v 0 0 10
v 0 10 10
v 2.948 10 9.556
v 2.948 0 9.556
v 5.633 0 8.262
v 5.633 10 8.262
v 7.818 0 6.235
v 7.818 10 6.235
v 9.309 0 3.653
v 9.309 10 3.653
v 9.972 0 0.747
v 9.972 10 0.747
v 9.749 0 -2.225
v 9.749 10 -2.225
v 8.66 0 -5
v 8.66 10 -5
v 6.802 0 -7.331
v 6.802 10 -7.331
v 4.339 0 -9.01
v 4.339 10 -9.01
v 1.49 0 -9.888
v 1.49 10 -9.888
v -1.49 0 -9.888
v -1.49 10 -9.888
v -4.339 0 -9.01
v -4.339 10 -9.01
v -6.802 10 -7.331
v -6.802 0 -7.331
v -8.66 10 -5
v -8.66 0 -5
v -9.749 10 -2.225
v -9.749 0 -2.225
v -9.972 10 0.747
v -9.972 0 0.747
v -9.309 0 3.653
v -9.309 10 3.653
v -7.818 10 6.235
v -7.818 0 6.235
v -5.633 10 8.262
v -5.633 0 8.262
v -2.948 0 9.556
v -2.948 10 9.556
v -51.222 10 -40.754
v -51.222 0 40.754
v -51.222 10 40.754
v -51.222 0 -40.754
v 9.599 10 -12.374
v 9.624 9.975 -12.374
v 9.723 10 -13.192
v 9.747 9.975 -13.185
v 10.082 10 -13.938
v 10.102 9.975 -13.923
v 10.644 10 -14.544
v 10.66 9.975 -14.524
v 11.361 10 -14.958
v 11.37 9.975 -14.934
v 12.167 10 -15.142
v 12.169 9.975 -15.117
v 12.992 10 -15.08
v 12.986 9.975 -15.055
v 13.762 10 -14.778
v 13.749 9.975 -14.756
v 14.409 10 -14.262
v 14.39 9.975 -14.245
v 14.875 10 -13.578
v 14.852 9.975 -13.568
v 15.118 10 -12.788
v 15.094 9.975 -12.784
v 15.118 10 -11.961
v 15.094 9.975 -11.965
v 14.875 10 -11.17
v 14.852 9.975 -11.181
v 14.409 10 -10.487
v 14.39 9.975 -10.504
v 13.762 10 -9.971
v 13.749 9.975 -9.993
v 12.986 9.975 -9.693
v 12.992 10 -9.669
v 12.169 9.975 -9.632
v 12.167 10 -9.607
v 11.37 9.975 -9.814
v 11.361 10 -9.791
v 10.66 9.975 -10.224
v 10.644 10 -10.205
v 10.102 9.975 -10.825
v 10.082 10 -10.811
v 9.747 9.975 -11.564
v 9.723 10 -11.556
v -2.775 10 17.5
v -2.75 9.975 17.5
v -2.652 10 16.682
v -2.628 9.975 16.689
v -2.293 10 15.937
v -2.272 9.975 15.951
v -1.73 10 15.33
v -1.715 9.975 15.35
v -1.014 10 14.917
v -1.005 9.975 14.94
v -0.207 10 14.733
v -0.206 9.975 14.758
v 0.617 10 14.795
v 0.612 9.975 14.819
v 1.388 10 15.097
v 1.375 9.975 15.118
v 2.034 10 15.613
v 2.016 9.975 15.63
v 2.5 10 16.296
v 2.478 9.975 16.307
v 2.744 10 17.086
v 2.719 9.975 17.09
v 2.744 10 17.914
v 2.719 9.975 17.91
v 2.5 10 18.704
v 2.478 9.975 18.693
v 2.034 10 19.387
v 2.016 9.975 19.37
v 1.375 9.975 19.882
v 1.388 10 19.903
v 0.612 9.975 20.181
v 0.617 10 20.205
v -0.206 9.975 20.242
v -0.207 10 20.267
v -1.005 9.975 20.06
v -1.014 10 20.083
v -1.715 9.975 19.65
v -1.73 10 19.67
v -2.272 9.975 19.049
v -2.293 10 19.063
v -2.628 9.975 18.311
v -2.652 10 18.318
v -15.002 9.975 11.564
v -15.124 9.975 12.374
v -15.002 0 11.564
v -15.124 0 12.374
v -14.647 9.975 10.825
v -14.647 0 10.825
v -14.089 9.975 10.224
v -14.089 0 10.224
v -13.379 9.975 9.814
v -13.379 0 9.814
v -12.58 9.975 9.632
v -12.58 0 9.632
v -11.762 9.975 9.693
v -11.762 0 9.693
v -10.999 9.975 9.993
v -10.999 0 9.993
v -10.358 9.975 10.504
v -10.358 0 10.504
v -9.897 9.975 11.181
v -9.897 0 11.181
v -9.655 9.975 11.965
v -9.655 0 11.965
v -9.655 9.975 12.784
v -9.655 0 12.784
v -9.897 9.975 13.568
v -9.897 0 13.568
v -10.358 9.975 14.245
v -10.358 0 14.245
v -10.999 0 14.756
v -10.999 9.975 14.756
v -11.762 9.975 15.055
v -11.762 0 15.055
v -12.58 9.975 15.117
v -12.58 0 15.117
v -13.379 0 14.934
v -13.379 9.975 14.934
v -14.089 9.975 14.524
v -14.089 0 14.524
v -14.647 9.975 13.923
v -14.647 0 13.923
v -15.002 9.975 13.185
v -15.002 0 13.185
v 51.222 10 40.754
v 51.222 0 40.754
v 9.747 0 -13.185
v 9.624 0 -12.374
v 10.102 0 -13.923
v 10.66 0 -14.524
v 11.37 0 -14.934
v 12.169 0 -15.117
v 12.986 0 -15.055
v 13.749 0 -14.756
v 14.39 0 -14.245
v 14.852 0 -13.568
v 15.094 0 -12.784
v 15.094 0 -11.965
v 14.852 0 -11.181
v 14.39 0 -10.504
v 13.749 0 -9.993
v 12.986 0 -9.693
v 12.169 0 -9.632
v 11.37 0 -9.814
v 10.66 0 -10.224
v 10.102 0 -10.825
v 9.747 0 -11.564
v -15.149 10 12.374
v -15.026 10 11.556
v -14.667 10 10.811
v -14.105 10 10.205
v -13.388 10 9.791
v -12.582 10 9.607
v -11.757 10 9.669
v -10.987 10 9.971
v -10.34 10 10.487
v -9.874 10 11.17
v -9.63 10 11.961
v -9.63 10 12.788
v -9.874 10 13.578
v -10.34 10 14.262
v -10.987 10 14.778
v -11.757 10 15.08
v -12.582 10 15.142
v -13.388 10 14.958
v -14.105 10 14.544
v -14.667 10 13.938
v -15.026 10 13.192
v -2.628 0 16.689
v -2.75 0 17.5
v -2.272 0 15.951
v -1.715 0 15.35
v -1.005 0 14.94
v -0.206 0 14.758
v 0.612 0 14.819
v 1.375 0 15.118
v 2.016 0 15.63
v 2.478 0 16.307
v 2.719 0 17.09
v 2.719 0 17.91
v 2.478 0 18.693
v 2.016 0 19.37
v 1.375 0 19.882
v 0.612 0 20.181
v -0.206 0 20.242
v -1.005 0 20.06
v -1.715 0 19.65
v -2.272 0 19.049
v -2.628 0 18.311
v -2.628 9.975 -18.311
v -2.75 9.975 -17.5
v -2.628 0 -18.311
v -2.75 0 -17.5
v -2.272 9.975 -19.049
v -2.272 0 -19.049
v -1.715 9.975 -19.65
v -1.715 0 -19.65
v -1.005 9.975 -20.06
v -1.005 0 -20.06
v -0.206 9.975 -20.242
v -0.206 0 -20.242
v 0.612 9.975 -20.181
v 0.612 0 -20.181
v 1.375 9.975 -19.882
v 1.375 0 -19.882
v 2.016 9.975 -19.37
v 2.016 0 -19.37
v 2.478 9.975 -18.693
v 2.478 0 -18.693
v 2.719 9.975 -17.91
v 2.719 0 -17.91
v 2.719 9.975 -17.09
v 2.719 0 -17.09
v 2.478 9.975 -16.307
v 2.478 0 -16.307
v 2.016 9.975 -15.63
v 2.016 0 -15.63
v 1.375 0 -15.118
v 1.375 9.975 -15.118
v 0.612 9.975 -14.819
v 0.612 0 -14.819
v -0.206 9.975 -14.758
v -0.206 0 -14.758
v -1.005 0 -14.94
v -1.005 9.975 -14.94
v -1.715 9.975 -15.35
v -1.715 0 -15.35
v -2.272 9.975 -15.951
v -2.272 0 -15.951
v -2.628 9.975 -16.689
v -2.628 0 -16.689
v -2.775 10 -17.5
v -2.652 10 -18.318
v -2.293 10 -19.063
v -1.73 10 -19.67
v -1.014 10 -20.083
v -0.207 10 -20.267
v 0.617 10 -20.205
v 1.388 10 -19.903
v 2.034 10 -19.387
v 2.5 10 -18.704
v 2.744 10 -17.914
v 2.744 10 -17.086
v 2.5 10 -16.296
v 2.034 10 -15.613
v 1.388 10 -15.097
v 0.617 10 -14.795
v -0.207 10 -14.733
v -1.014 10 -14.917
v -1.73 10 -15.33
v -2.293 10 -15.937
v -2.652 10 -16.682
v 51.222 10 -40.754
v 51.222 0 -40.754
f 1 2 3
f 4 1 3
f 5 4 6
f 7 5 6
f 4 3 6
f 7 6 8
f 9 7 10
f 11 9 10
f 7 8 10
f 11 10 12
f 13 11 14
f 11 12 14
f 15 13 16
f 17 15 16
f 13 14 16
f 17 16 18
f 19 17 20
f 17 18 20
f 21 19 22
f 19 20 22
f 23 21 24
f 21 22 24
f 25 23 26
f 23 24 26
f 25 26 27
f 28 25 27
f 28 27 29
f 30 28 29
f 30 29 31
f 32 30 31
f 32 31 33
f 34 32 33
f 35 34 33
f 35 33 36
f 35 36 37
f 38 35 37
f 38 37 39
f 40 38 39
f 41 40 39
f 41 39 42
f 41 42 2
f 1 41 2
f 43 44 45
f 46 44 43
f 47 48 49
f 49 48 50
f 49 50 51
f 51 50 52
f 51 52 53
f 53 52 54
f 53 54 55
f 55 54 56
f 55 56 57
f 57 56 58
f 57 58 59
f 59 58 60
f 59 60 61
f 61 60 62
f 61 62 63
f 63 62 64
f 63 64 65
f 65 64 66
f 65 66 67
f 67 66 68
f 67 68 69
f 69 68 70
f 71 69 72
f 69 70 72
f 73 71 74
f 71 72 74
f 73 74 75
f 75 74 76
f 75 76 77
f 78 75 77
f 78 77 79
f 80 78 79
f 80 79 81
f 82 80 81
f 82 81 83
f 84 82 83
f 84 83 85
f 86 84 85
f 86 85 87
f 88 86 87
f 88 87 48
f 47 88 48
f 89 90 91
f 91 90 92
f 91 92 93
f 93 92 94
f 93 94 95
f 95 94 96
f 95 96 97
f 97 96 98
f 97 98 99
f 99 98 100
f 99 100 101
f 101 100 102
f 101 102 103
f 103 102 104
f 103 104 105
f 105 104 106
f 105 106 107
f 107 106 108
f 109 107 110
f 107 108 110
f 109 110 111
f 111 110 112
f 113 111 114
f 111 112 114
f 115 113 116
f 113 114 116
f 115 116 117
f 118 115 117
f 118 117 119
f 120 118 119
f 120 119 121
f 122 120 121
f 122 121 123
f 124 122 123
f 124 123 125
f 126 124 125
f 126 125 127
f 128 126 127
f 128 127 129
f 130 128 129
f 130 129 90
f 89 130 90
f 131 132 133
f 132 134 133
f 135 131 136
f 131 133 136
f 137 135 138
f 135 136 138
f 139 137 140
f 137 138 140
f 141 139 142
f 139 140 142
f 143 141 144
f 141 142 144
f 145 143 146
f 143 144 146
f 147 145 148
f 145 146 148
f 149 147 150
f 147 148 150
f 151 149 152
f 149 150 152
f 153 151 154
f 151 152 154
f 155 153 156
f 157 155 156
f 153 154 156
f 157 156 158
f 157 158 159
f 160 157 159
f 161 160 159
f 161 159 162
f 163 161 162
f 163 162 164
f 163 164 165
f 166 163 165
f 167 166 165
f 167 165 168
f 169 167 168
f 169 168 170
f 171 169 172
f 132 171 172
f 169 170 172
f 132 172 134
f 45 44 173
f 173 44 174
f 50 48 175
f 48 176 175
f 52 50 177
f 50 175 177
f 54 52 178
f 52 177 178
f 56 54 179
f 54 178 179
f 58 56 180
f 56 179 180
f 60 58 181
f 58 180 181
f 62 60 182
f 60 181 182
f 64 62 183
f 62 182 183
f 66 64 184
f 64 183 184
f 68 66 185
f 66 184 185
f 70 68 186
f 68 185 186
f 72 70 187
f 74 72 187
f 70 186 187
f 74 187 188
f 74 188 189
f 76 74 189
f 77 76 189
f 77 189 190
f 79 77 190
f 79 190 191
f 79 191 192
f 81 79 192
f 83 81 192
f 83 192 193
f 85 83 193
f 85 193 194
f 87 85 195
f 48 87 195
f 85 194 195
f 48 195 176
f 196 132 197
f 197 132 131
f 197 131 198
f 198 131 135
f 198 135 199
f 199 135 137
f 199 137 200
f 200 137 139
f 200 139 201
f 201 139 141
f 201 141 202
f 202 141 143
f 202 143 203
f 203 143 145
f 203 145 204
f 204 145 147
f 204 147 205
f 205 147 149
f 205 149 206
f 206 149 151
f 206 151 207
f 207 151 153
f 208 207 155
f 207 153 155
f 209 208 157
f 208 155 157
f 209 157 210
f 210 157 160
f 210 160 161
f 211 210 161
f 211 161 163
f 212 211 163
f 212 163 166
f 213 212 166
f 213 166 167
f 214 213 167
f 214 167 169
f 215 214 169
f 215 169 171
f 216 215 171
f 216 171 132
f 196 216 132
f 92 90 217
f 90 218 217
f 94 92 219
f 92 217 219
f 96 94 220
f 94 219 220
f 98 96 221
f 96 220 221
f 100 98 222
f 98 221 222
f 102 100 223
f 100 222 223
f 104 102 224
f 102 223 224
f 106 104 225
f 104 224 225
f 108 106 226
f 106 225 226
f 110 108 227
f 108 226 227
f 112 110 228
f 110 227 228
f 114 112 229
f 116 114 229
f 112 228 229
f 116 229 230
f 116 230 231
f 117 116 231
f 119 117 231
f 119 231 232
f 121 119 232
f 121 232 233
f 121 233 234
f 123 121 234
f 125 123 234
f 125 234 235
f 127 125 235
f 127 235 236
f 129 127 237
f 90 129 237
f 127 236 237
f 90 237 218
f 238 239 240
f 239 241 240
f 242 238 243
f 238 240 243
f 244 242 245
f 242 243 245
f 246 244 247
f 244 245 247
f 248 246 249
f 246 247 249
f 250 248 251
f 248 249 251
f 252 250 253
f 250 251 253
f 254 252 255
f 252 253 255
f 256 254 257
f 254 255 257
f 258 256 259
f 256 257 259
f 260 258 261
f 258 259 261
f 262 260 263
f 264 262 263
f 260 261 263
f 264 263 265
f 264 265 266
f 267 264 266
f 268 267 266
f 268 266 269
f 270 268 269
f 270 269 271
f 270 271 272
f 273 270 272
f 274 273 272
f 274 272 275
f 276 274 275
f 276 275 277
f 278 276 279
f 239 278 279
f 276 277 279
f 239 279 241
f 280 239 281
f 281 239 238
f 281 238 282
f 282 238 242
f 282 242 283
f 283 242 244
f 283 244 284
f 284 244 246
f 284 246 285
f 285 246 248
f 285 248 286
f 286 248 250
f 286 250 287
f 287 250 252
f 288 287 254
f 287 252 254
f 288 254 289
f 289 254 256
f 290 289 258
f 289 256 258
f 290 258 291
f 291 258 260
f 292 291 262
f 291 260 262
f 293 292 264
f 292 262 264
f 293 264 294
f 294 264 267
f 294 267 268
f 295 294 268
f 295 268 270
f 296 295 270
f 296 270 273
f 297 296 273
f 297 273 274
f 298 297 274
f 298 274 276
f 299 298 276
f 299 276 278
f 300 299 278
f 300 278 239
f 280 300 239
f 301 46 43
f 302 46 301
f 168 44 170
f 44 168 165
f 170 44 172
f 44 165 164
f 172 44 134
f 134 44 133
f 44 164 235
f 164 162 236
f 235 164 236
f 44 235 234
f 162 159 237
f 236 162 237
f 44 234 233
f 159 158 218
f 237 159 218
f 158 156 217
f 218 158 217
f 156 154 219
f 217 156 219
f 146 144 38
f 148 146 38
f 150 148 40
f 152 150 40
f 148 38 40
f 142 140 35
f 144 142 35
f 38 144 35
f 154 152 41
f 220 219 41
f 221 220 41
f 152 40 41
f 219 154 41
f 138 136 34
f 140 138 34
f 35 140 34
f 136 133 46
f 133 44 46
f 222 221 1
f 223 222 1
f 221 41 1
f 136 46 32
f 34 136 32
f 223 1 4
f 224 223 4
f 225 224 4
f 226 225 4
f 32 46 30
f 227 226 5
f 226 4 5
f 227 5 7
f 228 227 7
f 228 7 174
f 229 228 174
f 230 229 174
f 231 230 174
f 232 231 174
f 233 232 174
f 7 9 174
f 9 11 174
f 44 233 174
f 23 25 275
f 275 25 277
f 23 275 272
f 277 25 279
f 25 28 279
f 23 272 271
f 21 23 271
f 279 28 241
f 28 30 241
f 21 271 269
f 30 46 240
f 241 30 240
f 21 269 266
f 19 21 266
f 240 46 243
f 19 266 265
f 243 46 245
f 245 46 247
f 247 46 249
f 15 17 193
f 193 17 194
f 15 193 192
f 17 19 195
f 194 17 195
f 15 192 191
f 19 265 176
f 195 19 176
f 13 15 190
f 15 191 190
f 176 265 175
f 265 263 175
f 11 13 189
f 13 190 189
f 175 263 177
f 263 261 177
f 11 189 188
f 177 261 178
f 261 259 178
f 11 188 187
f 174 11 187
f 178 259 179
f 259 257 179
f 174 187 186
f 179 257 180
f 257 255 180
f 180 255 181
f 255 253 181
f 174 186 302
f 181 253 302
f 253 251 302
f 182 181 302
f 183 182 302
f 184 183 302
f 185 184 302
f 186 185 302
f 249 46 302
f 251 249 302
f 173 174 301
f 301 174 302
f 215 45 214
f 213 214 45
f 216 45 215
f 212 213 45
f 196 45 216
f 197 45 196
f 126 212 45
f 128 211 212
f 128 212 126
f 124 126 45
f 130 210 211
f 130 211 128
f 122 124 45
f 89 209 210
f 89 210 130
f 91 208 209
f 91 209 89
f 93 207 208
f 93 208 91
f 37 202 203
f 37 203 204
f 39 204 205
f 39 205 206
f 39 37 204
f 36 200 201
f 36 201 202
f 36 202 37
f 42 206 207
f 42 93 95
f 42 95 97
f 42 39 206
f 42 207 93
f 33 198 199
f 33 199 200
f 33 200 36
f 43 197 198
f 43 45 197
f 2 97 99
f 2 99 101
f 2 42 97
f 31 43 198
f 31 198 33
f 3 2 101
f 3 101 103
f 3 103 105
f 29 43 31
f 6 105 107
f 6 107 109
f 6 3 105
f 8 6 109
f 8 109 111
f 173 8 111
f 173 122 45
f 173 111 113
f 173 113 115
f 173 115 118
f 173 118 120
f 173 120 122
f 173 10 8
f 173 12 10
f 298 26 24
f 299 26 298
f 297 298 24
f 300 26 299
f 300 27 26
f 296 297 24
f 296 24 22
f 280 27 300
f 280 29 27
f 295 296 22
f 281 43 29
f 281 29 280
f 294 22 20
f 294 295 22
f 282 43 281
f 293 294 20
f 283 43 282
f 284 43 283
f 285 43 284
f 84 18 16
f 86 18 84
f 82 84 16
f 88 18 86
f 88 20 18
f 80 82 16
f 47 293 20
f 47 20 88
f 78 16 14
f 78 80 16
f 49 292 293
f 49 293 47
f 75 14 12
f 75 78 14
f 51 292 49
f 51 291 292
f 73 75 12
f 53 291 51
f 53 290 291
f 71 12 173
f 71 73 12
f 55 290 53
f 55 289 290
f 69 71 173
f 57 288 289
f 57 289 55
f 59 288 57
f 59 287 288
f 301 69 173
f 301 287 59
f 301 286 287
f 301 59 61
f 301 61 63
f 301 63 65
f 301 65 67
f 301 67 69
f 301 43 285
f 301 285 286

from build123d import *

# Parameters (mm, degrees)
SKETCH1_W                      = 102.443759186
SKETCH1_H                      = 81.508386056
BOSS_EXTRUDE1_DEPTH            = 10
M5_CLEARANCE_HOLE1_D           = 5.5
M5_CLEARANCE_HOLE1_CSINK_D     = 5.55
M5_CLEARANCE_HOLE1_CSINK_ANGLE = 90
SKETCH5_R                      = 10
CUT_EXTRUDE1_DEPTH             = 67.216200422


with BuildPart() as part:
    # Sketch1 → Boss-Extrude1 (new body)
    with BuildSketch(Plane(origin=(0, 0, 0), x_dir=(1, 0, 0), z_dir=(0, 1, 0))):
        Rectangle(SKETCH1_W, SKETCH1_H)
    extrude(amount=BOSS_EXTRUDE1_DEPTH)

    # M5 Clearance Hole1 (through all)
    with Locations(Plane(origin=(0, 10, 0), x_dir=(1, 0, 0), z_dir=(0, 1, 0))):
        with Locations((-12.374368671, -12.374368671), (0, -17.5), (12.374368671, 12.374368671), (0, 17.5)):
            CounterSinkHole(M5_CLEARANCE_HOLE1_D / 2, M5_CLEARANCE_HOLE1_CSINK_D / 2, counter_sink_angle=M5_CLEARANCE_HOLE1_CSINK_ANGLE)

    # Sketch5 → Cut-Extrude1 (cut, through all)
    with BuildSketch(Plane(origin=(0, 10, 0), x_dir=(1, 0, 0), z_dir=(0, 1, 0))):
        with Locations(Location((0, 0, 0), (0, 0, 270))):
            Circle(SKETCH5_R)
    extrude(amount=-CUT_EXTRUDE1_DEPTH, mode=Mode.SUBTRACT)


solid = part.part
